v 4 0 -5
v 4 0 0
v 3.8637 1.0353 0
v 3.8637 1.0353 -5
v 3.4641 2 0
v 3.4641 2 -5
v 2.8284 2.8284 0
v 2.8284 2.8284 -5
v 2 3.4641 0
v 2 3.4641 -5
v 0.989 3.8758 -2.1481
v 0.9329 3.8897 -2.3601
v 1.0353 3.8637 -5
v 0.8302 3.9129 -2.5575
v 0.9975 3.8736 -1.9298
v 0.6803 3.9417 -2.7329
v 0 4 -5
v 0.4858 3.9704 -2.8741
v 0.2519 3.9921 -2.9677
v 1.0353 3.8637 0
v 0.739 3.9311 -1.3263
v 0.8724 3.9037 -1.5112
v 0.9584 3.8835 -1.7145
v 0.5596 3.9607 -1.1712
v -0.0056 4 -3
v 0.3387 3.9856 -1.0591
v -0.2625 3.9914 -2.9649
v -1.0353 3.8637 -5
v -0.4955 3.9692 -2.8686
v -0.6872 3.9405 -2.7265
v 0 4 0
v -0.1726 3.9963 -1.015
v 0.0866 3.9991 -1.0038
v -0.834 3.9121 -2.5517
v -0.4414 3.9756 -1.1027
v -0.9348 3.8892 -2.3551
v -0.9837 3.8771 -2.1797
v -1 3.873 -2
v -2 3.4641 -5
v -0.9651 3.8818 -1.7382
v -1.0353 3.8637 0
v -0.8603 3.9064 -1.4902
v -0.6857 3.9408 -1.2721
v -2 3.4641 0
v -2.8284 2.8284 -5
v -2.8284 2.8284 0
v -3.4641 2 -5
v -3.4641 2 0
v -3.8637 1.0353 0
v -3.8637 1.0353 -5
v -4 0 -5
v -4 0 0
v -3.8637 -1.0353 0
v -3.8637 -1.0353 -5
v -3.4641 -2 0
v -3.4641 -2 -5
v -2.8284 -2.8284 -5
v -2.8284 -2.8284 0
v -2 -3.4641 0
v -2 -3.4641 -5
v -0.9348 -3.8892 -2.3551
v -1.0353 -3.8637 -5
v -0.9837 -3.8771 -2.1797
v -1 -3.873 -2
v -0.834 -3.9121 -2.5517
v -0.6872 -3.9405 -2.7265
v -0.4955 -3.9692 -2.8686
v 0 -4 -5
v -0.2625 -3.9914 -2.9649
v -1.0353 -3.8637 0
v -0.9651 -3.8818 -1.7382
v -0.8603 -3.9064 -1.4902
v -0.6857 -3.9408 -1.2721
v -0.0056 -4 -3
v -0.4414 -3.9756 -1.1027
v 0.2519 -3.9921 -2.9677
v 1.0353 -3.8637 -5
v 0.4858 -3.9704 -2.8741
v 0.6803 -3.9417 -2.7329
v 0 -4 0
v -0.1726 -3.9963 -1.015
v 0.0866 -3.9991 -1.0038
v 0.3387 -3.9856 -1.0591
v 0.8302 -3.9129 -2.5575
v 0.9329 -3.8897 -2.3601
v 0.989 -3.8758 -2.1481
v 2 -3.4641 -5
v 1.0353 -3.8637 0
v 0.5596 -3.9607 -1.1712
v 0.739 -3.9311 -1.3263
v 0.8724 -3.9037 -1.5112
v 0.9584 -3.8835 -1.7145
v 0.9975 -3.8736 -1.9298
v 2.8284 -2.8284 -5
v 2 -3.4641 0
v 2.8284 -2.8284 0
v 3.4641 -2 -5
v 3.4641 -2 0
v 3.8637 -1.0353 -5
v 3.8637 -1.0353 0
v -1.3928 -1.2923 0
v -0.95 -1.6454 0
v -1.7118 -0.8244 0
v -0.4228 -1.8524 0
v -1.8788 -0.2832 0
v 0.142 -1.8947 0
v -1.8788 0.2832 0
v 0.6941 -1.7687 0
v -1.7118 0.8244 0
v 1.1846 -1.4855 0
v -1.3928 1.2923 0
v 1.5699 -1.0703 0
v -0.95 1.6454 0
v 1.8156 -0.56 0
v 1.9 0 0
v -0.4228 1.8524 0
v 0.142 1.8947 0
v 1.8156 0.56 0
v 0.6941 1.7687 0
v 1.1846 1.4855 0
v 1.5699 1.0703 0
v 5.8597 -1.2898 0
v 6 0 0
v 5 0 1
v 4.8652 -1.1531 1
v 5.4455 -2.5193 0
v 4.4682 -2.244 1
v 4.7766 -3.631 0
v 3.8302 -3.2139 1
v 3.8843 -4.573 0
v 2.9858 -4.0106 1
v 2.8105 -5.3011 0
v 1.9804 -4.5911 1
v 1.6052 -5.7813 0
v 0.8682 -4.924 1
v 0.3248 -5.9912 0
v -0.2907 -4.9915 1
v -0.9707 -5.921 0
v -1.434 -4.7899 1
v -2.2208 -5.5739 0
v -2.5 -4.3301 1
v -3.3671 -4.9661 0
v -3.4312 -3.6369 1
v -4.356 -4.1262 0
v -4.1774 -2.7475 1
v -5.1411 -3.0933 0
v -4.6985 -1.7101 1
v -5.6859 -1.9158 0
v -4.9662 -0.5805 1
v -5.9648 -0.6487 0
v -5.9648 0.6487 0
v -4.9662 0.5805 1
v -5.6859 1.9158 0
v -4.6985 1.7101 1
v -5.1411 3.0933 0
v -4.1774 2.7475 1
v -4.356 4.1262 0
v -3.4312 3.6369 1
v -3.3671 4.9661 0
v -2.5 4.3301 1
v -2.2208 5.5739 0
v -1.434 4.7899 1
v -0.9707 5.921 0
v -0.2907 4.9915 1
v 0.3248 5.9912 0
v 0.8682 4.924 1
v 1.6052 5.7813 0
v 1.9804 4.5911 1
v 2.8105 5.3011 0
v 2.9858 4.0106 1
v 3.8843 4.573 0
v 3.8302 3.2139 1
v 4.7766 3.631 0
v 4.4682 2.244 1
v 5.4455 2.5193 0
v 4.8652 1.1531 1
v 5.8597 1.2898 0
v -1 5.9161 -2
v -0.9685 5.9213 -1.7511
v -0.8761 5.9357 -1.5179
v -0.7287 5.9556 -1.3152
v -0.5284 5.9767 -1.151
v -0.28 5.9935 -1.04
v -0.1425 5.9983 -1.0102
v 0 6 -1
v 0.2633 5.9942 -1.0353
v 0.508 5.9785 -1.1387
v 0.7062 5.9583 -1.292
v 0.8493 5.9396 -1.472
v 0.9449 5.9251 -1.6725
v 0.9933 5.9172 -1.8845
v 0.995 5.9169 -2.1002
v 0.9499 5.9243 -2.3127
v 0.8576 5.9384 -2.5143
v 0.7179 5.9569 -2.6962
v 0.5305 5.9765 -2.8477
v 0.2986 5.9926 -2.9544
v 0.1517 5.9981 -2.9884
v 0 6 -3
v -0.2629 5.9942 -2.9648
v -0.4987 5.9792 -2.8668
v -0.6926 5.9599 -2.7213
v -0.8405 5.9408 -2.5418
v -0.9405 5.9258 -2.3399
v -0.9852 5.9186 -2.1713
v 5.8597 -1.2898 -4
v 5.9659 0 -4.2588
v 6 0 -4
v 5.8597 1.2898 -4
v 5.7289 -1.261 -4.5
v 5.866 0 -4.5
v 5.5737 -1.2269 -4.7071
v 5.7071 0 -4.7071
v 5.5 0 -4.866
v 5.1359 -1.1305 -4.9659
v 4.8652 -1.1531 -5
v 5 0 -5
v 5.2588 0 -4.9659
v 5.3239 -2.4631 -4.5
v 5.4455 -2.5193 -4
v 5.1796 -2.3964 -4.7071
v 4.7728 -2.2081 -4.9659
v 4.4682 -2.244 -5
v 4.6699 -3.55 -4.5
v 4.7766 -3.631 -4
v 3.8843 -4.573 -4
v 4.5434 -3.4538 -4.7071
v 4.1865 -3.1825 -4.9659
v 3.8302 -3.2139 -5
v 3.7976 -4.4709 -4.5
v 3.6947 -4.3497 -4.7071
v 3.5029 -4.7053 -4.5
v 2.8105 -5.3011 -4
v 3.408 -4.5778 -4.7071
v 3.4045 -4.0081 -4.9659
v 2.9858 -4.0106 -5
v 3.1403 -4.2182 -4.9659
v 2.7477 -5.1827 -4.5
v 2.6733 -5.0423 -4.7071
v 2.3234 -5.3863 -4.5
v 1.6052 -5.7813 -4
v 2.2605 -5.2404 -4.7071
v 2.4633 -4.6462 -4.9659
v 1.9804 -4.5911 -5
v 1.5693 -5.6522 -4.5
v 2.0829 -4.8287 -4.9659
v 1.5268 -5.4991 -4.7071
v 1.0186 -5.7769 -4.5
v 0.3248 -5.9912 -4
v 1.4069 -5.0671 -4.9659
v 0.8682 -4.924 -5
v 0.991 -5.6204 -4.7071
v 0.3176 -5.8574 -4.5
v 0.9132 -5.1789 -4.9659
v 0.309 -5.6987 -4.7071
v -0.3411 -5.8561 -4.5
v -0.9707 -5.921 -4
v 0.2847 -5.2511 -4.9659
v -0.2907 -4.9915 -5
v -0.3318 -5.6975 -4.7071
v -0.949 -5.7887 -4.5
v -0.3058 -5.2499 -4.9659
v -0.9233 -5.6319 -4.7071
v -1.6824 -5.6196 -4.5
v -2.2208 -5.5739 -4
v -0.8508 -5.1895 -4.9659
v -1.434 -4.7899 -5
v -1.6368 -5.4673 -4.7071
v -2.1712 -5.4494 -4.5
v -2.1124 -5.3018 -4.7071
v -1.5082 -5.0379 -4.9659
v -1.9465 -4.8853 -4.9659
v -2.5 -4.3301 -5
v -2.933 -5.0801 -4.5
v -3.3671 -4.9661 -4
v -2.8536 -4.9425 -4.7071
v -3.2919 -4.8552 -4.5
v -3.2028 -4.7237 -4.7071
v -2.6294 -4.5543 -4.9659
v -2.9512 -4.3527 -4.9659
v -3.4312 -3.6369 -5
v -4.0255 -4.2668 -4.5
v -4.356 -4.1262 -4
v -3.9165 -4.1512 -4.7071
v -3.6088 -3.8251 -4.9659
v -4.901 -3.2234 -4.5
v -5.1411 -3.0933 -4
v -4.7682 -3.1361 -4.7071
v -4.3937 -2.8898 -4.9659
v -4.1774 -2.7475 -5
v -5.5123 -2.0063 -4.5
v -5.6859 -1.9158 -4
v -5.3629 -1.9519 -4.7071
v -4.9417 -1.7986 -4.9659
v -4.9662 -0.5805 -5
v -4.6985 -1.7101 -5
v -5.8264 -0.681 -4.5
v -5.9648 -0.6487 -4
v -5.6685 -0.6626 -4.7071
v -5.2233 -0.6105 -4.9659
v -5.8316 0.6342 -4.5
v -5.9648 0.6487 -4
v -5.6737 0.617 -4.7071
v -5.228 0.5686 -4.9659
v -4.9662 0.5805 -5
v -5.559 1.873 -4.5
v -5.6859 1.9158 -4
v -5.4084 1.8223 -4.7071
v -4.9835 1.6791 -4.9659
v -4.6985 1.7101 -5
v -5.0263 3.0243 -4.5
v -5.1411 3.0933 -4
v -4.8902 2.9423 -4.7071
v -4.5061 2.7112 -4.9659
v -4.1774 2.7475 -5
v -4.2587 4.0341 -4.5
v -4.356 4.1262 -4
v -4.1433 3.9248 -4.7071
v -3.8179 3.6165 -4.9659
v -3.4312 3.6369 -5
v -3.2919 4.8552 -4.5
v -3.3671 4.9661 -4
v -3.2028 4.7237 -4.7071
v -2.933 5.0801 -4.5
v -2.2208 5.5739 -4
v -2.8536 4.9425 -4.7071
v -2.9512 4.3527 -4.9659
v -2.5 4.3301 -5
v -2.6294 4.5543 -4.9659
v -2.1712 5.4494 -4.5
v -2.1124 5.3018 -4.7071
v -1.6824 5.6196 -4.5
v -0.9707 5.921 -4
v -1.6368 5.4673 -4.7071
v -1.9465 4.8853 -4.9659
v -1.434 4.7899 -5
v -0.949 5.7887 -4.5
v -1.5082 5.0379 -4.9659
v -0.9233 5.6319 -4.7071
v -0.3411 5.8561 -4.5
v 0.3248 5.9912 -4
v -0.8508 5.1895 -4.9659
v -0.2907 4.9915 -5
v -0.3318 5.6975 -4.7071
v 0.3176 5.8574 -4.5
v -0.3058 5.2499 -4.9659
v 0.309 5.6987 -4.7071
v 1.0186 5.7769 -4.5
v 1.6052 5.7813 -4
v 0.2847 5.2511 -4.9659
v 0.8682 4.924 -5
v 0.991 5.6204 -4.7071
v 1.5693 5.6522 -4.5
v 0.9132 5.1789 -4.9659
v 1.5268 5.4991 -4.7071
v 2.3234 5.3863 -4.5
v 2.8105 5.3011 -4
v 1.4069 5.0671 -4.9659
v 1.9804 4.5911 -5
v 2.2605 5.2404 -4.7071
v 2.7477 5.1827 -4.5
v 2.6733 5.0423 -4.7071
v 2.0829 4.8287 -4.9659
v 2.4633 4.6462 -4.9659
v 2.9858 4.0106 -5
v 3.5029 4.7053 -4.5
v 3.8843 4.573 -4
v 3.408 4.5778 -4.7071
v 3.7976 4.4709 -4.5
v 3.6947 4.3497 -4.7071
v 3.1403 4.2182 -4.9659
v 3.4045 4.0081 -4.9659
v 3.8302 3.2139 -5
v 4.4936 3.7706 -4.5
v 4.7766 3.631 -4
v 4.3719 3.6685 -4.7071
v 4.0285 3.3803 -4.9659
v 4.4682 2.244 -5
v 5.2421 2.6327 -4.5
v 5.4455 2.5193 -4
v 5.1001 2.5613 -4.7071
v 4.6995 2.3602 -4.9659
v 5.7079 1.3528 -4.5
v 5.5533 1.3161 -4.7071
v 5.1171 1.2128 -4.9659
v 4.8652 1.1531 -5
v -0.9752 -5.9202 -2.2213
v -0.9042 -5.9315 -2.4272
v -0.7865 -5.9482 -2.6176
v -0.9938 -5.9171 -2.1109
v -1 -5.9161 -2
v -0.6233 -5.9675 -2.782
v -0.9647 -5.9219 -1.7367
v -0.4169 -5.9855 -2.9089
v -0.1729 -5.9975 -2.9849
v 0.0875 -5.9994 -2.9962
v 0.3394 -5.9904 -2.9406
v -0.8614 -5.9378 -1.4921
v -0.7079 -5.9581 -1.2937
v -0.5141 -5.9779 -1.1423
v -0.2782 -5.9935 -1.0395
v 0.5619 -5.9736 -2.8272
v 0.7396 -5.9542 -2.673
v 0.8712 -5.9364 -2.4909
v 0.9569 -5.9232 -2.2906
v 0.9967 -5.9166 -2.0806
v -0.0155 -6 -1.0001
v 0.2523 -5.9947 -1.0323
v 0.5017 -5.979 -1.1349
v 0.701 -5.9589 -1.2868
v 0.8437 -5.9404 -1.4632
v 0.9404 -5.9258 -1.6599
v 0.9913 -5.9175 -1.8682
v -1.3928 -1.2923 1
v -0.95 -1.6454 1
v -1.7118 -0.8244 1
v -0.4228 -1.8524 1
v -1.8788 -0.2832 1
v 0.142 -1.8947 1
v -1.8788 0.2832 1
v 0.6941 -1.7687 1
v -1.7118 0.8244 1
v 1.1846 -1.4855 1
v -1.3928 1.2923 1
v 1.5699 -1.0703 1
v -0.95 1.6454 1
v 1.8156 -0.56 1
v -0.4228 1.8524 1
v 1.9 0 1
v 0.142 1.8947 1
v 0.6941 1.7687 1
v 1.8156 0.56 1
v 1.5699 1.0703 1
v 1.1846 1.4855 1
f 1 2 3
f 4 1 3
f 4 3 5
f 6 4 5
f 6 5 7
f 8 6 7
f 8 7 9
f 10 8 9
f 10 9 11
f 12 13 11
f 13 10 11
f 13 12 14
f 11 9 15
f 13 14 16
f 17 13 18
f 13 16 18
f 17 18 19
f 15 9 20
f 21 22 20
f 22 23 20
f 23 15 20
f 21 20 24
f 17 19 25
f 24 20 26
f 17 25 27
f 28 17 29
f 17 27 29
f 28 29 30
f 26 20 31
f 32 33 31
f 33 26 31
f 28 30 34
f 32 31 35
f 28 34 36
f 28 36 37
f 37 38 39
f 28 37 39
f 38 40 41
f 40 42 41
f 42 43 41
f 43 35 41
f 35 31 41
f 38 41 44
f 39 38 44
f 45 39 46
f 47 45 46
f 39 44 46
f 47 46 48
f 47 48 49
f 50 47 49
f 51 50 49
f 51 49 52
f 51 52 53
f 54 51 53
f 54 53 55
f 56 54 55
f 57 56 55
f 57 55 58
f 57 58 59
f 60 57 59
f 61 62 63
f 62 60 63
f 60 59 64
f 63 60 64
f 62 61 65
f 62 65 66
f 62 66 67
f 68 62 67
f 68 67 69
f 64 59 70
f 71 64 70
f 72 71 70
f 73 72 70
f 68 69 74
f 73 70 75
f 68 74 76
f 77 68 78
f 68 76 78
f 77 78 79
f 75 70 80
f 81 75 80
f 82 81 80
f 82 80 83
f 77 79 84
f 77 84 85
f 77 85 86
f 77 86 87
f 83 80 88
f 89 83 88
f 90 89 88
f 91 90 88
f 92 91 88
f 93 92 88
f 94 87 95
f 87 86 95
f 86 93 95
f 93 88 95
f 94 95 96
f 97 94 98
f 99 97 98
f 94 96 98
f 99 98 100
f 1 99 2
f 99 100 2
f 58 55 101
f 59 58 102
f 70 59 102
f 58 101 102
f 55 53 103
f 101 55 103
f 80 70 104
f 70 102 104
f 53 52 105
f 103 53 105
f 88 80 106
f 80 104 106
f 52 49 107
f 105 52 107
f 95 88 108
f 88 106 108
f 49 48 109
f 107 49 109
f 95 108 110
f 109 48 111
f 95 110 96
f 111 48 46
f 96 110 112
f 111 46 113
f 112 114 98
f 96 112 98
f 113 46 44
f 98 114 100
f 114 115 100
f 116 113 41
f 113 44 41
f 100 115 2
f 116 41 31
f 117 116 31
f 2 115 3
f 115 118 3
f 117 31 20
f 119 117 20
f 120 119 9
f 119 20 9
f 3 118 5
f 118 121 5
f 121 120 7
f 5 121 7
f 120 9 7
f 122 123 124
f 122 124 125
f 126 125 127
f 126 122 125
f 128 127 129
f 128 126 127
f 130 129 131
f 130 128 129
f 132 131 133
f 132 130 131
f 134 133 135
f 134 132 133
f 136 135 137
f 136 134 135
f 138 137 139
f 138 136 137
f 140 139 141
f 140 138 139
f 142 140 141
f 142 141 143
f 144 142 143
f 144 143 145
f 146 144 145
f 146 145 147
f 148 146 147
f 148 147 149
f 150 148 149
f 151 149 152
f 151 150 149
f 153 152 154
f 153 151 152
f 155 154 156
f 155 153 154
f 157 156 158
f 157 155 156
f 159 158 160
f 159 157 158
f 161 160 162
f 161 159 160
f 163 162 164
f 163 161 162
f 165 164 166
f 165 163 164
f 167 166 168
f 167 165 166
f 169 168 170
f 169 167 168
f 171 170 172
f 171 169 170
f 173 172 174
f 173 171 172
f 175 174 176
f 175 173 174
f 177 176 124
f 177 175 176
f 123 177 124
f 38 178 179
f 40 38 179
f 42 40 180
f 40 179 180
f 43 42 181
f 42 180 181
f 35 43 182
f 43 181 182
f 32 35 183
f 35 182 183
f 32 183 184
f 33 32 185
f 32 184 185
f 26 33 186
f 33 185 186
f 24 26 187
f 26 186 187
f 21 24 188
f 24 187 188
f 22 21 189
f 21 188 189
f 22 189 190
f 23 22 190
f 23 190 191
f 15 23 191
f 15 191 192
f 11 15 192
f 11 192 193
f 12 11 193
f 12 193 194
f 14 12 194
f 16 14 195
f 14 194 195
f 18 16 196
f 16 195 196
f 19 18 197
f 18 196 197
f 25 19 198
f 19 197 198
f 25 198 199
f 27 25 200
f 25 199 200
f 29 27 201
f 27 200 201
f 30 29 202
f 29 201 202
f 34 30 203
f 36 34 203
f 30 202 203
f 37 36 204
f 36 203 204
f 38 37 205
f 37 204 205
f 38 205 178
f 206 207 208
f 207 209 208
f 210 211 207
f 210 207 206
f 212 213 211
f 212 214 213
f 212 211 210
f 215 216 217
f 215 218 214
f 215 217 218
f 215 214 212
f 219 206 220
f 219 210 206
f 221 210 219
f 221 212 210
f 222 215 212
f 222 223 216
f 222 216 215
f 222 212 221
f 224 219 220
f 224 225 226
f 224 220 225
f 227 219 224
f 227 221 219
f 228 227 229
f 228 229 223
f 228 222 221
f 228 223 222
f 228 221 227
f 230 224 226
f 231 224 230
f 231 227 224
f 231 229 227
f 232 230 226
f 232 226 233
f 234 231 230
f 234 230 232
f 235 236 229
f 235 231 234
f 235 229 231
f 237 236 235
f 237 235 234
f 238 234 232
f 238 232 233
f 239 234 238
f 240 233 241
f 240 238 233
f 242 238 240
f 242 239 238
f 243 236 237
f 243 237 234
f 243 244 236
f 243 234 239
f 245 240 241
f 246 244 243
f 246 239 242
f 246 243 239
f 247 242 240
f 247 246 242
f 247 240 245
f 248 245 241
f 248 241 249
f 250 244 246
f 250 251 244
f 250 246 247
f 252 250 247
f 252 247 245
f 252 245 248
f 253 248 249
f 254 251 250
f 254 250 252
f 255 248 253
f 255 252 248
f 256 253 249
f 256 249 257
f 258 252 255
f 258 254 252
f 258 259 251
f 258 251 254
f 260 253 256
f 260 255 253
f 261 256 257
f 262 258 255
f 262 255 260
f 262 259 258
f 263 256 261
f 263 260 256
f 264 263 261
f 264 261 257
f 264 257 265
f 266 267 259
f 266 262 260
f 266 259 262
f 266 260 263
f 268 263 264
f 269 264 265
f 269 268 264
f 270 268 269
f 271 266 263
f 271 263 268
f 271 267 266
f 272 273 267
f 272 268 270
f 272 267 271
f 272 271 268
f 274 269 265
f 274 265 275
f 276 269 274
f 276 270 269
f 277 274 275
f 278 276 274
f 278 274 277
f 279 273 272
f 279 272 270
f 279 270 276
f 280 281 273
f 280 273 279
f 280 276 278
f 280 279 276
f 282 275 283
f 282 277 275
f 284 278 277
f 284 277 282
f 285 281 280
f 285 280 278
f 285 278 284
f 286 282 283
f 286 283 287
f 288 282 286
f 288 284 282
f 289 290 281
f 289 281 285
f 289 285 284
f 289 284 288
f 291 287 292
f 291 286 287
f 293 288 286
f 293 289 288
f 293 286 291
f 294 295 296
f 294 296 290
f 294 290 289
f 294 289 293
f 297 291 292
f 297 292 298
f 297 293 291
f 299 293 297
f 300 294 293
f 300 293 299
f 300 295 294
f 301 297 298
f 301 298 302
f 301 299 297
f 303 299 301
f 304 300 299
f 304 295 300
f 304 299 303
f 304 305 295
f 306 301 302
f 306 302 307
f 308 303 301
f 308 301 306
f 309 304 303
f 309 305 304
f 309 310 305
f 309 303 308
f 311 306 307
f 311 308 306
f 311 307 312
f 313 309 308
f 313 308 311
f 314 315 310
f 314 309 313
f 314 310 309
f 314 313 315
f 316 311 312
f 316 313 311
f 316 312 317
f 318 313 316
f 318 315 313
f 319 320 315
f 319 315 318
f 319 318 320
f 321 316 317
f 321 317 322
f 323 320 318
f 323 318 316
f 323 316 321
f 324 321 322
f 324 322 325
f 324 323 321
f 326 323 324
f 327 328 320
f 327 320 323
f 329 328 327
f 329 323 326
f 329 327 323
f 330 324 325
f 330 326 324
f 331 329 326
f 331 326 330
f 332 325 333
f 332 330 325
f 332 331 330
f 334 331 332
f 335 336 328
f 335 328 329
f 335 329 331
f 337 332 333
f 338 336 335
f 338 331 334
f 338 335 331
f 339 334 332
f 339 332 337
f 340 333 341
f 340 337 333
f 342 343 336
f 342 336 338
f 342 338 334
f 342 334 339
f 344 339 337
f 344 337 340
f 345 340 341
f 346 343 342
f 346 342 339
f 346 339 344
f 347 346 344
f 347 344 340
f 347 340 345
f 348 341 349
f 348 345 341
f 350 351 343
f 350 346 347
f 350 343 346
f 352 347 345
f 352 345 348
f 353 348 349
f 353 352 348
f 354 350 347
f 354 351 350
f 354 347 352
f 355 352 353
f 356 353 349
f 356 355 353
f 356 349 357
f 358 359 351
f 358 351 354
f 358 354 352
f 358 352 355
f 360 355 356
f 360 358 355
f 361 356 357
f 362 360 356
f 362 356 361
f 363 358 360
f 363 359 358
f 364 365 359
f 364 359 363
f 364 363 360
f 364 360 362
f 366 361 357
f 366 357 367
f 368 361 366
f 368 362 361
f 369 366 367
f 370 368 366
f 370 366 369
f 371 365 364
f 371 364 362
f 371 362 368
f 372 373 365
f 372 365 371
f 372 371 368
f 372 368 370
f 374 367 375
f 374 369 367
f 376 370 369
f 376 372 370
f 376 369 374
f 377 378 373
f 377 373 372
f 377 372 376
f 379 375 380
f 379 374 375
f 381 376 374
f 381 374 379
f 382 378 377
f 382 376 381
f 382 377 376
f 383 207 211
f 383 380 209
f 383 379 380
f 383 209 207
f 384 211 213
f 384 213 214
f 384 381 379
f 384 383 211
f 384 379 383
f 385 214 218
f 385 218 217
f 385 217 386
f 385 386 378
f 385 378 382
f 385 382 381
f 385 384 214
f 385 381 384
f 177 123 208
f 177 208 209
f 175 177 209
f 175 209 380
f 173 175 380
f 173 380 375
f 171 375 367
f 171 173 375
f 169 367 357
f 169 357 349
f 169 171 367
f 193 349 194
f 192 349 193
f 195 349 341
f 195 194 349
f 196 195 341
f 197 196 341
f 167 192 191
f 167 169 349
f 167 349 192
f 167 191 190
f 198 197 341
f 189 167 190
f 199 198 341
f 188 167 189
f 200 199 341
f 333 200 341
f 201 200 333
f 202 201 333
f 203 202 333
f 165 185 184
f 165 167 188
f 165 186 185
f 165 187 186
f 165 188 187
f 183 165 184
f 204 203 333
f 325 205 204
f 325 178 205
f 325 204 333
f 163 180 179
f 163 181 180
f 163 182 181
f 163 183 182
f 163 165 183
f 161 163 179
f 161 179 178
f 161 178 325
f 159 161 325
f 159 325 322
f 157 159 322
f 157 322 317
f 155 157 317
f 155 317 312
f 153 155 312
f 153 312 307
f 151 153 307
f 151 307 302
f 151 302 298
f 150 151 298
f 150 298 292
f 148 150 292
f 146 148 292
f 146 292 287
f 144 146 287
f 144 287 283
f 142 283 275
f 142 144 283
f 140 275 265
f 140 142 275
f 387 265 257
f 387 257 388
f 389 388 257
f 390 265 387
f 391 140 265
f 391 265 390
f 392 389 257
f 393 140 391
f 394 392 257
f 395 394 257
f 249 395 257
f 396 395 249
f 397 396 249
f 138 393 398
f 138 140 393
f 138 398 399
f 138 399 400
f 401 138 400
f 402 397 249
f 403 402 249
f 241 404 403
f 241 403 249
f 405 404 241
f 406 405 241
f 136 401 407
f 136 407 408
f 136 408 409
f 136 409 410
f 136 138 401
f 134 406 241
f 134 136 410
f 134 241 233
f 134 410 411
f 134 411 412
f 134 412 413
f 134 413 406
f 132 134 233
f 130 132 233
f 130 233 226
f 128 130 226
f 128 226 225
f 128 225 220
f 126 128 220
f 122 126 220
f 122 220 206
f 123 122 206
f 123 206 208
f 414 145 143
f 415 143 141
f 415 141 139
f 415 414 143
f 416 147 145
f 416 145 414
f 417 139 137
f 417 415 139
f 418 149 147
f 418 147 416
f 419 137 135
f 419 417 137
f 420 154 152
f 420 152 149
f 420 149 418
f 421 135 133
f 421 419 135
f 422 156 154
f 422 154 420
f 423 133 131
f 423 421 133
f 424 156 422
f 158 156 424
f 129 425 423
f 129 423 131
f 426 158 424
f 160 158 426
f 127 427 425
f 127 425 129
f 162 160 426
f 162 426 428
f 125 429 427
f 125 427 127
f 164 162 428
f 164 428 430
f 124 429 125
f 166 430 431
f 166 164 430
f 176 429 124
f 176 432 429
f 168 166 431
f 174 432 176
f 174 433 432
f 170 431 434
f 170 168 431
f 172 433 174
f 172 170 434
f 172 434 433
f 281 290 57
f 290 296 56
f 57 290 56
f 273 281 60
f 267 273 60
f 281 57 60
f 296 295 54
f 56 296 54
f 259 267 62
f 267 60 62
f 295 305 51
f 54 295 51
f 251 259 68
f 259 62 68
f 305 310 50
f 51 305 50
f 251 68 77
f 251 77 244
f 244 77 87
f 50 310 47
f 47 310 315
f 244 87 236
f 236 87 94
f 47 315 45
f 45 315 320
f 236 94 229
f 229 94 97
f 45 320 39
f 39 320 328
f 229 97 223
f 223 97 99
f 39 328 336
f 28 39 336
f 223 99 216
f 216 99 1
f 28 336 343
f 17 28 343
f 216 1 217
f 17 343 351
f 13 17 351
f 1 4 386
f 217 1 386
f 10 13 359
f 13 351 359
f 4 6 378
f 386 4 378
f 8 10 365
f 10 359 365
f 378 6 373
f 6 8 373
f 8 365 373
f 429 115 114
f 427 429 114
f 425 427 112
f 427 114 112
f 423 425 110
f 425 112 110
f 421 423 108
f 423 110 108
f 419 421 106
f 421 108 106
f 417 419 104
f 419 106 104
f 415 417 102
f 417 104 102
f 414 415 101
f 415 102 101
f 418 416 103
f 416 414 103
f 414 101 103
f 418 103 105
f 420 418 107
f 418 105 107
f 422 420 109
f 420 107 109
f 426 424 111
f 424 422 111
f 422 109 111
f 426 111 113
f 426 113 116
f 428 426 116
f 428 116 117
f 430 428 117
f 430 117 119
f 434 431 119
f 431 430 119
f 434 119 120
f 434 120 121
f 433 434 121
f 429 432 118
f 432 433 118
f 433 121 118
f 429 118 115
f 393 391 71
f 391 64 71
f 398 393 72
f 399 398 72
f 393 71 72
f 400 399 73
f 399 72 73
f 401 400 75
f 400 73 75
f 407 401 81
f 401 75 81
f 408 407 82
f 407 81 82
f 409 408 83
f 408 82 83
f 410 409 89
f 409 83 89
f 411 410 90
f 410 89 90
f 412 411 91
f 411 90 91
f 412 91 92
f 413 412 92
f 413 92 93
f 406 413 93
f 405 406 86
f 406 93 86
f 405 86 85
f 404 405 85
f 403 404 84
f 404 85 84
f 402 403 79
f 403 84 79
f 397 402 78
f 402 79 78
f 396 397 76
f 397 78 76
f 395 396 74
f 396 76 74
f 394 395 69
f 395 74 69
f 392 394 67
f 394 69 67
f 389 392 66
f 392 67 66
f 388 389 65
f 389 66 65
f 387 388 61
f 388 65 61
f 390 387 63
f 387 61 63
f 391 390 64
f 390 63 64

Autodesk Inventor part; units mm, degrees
ref_plane "YZ Plane" through (0, 0, 0) normal (1, 0, 0) x (0, 1, 0)
ref_plane "XY Plane" through (0, 0, 0) normal (0, 0, 1) x (1, 0, 0)
sketch "스케치1" plane through (0, 0, 0) normal (0, 0, 1) x (1, 0, 0)
  circle A0 centre (0, 0) radius 4
  circle A1 centre (0, 0) radius 6
  circle A2 centre (0, 0) radius 1.9
  dimension "d0" = 8
  dimension "d1" = 2
  dimension "d11" = 3.8
extrude "돌출1" add sketch "스케치1" along normal blind 1 contours A0 | A1
extrude "돌출2" add sketch "스케치1" against normal blind 5 contours A1
ref_plane "작업 평면1" through (0, 6, 0) normal (0, 1, 0) x (-1, 0, 0)
sketch "스케치2" plane through (0, 6, 0) normal (0, 1, 0) x (-1, 0, 0)
  circle A0 centre (0, -2) radius 1
  line L0 (-6, -5) -> (6, -5) projected
  line L1 (-4, 0) -> (4, 0) projected
  point P0 (0, 0)
  dimension "d6" = 2
  dimension "d10" = 2
extrude "돌출3" cut sketch "스케치2" against normal through all
chamfer "모따기1" distance 1 angle 45 1 edges at (-6, 0, 1)
fillet "모깎기1" radius 1 1 edges at (-6, 0, -5)
properties part number "SuspensionLock"
